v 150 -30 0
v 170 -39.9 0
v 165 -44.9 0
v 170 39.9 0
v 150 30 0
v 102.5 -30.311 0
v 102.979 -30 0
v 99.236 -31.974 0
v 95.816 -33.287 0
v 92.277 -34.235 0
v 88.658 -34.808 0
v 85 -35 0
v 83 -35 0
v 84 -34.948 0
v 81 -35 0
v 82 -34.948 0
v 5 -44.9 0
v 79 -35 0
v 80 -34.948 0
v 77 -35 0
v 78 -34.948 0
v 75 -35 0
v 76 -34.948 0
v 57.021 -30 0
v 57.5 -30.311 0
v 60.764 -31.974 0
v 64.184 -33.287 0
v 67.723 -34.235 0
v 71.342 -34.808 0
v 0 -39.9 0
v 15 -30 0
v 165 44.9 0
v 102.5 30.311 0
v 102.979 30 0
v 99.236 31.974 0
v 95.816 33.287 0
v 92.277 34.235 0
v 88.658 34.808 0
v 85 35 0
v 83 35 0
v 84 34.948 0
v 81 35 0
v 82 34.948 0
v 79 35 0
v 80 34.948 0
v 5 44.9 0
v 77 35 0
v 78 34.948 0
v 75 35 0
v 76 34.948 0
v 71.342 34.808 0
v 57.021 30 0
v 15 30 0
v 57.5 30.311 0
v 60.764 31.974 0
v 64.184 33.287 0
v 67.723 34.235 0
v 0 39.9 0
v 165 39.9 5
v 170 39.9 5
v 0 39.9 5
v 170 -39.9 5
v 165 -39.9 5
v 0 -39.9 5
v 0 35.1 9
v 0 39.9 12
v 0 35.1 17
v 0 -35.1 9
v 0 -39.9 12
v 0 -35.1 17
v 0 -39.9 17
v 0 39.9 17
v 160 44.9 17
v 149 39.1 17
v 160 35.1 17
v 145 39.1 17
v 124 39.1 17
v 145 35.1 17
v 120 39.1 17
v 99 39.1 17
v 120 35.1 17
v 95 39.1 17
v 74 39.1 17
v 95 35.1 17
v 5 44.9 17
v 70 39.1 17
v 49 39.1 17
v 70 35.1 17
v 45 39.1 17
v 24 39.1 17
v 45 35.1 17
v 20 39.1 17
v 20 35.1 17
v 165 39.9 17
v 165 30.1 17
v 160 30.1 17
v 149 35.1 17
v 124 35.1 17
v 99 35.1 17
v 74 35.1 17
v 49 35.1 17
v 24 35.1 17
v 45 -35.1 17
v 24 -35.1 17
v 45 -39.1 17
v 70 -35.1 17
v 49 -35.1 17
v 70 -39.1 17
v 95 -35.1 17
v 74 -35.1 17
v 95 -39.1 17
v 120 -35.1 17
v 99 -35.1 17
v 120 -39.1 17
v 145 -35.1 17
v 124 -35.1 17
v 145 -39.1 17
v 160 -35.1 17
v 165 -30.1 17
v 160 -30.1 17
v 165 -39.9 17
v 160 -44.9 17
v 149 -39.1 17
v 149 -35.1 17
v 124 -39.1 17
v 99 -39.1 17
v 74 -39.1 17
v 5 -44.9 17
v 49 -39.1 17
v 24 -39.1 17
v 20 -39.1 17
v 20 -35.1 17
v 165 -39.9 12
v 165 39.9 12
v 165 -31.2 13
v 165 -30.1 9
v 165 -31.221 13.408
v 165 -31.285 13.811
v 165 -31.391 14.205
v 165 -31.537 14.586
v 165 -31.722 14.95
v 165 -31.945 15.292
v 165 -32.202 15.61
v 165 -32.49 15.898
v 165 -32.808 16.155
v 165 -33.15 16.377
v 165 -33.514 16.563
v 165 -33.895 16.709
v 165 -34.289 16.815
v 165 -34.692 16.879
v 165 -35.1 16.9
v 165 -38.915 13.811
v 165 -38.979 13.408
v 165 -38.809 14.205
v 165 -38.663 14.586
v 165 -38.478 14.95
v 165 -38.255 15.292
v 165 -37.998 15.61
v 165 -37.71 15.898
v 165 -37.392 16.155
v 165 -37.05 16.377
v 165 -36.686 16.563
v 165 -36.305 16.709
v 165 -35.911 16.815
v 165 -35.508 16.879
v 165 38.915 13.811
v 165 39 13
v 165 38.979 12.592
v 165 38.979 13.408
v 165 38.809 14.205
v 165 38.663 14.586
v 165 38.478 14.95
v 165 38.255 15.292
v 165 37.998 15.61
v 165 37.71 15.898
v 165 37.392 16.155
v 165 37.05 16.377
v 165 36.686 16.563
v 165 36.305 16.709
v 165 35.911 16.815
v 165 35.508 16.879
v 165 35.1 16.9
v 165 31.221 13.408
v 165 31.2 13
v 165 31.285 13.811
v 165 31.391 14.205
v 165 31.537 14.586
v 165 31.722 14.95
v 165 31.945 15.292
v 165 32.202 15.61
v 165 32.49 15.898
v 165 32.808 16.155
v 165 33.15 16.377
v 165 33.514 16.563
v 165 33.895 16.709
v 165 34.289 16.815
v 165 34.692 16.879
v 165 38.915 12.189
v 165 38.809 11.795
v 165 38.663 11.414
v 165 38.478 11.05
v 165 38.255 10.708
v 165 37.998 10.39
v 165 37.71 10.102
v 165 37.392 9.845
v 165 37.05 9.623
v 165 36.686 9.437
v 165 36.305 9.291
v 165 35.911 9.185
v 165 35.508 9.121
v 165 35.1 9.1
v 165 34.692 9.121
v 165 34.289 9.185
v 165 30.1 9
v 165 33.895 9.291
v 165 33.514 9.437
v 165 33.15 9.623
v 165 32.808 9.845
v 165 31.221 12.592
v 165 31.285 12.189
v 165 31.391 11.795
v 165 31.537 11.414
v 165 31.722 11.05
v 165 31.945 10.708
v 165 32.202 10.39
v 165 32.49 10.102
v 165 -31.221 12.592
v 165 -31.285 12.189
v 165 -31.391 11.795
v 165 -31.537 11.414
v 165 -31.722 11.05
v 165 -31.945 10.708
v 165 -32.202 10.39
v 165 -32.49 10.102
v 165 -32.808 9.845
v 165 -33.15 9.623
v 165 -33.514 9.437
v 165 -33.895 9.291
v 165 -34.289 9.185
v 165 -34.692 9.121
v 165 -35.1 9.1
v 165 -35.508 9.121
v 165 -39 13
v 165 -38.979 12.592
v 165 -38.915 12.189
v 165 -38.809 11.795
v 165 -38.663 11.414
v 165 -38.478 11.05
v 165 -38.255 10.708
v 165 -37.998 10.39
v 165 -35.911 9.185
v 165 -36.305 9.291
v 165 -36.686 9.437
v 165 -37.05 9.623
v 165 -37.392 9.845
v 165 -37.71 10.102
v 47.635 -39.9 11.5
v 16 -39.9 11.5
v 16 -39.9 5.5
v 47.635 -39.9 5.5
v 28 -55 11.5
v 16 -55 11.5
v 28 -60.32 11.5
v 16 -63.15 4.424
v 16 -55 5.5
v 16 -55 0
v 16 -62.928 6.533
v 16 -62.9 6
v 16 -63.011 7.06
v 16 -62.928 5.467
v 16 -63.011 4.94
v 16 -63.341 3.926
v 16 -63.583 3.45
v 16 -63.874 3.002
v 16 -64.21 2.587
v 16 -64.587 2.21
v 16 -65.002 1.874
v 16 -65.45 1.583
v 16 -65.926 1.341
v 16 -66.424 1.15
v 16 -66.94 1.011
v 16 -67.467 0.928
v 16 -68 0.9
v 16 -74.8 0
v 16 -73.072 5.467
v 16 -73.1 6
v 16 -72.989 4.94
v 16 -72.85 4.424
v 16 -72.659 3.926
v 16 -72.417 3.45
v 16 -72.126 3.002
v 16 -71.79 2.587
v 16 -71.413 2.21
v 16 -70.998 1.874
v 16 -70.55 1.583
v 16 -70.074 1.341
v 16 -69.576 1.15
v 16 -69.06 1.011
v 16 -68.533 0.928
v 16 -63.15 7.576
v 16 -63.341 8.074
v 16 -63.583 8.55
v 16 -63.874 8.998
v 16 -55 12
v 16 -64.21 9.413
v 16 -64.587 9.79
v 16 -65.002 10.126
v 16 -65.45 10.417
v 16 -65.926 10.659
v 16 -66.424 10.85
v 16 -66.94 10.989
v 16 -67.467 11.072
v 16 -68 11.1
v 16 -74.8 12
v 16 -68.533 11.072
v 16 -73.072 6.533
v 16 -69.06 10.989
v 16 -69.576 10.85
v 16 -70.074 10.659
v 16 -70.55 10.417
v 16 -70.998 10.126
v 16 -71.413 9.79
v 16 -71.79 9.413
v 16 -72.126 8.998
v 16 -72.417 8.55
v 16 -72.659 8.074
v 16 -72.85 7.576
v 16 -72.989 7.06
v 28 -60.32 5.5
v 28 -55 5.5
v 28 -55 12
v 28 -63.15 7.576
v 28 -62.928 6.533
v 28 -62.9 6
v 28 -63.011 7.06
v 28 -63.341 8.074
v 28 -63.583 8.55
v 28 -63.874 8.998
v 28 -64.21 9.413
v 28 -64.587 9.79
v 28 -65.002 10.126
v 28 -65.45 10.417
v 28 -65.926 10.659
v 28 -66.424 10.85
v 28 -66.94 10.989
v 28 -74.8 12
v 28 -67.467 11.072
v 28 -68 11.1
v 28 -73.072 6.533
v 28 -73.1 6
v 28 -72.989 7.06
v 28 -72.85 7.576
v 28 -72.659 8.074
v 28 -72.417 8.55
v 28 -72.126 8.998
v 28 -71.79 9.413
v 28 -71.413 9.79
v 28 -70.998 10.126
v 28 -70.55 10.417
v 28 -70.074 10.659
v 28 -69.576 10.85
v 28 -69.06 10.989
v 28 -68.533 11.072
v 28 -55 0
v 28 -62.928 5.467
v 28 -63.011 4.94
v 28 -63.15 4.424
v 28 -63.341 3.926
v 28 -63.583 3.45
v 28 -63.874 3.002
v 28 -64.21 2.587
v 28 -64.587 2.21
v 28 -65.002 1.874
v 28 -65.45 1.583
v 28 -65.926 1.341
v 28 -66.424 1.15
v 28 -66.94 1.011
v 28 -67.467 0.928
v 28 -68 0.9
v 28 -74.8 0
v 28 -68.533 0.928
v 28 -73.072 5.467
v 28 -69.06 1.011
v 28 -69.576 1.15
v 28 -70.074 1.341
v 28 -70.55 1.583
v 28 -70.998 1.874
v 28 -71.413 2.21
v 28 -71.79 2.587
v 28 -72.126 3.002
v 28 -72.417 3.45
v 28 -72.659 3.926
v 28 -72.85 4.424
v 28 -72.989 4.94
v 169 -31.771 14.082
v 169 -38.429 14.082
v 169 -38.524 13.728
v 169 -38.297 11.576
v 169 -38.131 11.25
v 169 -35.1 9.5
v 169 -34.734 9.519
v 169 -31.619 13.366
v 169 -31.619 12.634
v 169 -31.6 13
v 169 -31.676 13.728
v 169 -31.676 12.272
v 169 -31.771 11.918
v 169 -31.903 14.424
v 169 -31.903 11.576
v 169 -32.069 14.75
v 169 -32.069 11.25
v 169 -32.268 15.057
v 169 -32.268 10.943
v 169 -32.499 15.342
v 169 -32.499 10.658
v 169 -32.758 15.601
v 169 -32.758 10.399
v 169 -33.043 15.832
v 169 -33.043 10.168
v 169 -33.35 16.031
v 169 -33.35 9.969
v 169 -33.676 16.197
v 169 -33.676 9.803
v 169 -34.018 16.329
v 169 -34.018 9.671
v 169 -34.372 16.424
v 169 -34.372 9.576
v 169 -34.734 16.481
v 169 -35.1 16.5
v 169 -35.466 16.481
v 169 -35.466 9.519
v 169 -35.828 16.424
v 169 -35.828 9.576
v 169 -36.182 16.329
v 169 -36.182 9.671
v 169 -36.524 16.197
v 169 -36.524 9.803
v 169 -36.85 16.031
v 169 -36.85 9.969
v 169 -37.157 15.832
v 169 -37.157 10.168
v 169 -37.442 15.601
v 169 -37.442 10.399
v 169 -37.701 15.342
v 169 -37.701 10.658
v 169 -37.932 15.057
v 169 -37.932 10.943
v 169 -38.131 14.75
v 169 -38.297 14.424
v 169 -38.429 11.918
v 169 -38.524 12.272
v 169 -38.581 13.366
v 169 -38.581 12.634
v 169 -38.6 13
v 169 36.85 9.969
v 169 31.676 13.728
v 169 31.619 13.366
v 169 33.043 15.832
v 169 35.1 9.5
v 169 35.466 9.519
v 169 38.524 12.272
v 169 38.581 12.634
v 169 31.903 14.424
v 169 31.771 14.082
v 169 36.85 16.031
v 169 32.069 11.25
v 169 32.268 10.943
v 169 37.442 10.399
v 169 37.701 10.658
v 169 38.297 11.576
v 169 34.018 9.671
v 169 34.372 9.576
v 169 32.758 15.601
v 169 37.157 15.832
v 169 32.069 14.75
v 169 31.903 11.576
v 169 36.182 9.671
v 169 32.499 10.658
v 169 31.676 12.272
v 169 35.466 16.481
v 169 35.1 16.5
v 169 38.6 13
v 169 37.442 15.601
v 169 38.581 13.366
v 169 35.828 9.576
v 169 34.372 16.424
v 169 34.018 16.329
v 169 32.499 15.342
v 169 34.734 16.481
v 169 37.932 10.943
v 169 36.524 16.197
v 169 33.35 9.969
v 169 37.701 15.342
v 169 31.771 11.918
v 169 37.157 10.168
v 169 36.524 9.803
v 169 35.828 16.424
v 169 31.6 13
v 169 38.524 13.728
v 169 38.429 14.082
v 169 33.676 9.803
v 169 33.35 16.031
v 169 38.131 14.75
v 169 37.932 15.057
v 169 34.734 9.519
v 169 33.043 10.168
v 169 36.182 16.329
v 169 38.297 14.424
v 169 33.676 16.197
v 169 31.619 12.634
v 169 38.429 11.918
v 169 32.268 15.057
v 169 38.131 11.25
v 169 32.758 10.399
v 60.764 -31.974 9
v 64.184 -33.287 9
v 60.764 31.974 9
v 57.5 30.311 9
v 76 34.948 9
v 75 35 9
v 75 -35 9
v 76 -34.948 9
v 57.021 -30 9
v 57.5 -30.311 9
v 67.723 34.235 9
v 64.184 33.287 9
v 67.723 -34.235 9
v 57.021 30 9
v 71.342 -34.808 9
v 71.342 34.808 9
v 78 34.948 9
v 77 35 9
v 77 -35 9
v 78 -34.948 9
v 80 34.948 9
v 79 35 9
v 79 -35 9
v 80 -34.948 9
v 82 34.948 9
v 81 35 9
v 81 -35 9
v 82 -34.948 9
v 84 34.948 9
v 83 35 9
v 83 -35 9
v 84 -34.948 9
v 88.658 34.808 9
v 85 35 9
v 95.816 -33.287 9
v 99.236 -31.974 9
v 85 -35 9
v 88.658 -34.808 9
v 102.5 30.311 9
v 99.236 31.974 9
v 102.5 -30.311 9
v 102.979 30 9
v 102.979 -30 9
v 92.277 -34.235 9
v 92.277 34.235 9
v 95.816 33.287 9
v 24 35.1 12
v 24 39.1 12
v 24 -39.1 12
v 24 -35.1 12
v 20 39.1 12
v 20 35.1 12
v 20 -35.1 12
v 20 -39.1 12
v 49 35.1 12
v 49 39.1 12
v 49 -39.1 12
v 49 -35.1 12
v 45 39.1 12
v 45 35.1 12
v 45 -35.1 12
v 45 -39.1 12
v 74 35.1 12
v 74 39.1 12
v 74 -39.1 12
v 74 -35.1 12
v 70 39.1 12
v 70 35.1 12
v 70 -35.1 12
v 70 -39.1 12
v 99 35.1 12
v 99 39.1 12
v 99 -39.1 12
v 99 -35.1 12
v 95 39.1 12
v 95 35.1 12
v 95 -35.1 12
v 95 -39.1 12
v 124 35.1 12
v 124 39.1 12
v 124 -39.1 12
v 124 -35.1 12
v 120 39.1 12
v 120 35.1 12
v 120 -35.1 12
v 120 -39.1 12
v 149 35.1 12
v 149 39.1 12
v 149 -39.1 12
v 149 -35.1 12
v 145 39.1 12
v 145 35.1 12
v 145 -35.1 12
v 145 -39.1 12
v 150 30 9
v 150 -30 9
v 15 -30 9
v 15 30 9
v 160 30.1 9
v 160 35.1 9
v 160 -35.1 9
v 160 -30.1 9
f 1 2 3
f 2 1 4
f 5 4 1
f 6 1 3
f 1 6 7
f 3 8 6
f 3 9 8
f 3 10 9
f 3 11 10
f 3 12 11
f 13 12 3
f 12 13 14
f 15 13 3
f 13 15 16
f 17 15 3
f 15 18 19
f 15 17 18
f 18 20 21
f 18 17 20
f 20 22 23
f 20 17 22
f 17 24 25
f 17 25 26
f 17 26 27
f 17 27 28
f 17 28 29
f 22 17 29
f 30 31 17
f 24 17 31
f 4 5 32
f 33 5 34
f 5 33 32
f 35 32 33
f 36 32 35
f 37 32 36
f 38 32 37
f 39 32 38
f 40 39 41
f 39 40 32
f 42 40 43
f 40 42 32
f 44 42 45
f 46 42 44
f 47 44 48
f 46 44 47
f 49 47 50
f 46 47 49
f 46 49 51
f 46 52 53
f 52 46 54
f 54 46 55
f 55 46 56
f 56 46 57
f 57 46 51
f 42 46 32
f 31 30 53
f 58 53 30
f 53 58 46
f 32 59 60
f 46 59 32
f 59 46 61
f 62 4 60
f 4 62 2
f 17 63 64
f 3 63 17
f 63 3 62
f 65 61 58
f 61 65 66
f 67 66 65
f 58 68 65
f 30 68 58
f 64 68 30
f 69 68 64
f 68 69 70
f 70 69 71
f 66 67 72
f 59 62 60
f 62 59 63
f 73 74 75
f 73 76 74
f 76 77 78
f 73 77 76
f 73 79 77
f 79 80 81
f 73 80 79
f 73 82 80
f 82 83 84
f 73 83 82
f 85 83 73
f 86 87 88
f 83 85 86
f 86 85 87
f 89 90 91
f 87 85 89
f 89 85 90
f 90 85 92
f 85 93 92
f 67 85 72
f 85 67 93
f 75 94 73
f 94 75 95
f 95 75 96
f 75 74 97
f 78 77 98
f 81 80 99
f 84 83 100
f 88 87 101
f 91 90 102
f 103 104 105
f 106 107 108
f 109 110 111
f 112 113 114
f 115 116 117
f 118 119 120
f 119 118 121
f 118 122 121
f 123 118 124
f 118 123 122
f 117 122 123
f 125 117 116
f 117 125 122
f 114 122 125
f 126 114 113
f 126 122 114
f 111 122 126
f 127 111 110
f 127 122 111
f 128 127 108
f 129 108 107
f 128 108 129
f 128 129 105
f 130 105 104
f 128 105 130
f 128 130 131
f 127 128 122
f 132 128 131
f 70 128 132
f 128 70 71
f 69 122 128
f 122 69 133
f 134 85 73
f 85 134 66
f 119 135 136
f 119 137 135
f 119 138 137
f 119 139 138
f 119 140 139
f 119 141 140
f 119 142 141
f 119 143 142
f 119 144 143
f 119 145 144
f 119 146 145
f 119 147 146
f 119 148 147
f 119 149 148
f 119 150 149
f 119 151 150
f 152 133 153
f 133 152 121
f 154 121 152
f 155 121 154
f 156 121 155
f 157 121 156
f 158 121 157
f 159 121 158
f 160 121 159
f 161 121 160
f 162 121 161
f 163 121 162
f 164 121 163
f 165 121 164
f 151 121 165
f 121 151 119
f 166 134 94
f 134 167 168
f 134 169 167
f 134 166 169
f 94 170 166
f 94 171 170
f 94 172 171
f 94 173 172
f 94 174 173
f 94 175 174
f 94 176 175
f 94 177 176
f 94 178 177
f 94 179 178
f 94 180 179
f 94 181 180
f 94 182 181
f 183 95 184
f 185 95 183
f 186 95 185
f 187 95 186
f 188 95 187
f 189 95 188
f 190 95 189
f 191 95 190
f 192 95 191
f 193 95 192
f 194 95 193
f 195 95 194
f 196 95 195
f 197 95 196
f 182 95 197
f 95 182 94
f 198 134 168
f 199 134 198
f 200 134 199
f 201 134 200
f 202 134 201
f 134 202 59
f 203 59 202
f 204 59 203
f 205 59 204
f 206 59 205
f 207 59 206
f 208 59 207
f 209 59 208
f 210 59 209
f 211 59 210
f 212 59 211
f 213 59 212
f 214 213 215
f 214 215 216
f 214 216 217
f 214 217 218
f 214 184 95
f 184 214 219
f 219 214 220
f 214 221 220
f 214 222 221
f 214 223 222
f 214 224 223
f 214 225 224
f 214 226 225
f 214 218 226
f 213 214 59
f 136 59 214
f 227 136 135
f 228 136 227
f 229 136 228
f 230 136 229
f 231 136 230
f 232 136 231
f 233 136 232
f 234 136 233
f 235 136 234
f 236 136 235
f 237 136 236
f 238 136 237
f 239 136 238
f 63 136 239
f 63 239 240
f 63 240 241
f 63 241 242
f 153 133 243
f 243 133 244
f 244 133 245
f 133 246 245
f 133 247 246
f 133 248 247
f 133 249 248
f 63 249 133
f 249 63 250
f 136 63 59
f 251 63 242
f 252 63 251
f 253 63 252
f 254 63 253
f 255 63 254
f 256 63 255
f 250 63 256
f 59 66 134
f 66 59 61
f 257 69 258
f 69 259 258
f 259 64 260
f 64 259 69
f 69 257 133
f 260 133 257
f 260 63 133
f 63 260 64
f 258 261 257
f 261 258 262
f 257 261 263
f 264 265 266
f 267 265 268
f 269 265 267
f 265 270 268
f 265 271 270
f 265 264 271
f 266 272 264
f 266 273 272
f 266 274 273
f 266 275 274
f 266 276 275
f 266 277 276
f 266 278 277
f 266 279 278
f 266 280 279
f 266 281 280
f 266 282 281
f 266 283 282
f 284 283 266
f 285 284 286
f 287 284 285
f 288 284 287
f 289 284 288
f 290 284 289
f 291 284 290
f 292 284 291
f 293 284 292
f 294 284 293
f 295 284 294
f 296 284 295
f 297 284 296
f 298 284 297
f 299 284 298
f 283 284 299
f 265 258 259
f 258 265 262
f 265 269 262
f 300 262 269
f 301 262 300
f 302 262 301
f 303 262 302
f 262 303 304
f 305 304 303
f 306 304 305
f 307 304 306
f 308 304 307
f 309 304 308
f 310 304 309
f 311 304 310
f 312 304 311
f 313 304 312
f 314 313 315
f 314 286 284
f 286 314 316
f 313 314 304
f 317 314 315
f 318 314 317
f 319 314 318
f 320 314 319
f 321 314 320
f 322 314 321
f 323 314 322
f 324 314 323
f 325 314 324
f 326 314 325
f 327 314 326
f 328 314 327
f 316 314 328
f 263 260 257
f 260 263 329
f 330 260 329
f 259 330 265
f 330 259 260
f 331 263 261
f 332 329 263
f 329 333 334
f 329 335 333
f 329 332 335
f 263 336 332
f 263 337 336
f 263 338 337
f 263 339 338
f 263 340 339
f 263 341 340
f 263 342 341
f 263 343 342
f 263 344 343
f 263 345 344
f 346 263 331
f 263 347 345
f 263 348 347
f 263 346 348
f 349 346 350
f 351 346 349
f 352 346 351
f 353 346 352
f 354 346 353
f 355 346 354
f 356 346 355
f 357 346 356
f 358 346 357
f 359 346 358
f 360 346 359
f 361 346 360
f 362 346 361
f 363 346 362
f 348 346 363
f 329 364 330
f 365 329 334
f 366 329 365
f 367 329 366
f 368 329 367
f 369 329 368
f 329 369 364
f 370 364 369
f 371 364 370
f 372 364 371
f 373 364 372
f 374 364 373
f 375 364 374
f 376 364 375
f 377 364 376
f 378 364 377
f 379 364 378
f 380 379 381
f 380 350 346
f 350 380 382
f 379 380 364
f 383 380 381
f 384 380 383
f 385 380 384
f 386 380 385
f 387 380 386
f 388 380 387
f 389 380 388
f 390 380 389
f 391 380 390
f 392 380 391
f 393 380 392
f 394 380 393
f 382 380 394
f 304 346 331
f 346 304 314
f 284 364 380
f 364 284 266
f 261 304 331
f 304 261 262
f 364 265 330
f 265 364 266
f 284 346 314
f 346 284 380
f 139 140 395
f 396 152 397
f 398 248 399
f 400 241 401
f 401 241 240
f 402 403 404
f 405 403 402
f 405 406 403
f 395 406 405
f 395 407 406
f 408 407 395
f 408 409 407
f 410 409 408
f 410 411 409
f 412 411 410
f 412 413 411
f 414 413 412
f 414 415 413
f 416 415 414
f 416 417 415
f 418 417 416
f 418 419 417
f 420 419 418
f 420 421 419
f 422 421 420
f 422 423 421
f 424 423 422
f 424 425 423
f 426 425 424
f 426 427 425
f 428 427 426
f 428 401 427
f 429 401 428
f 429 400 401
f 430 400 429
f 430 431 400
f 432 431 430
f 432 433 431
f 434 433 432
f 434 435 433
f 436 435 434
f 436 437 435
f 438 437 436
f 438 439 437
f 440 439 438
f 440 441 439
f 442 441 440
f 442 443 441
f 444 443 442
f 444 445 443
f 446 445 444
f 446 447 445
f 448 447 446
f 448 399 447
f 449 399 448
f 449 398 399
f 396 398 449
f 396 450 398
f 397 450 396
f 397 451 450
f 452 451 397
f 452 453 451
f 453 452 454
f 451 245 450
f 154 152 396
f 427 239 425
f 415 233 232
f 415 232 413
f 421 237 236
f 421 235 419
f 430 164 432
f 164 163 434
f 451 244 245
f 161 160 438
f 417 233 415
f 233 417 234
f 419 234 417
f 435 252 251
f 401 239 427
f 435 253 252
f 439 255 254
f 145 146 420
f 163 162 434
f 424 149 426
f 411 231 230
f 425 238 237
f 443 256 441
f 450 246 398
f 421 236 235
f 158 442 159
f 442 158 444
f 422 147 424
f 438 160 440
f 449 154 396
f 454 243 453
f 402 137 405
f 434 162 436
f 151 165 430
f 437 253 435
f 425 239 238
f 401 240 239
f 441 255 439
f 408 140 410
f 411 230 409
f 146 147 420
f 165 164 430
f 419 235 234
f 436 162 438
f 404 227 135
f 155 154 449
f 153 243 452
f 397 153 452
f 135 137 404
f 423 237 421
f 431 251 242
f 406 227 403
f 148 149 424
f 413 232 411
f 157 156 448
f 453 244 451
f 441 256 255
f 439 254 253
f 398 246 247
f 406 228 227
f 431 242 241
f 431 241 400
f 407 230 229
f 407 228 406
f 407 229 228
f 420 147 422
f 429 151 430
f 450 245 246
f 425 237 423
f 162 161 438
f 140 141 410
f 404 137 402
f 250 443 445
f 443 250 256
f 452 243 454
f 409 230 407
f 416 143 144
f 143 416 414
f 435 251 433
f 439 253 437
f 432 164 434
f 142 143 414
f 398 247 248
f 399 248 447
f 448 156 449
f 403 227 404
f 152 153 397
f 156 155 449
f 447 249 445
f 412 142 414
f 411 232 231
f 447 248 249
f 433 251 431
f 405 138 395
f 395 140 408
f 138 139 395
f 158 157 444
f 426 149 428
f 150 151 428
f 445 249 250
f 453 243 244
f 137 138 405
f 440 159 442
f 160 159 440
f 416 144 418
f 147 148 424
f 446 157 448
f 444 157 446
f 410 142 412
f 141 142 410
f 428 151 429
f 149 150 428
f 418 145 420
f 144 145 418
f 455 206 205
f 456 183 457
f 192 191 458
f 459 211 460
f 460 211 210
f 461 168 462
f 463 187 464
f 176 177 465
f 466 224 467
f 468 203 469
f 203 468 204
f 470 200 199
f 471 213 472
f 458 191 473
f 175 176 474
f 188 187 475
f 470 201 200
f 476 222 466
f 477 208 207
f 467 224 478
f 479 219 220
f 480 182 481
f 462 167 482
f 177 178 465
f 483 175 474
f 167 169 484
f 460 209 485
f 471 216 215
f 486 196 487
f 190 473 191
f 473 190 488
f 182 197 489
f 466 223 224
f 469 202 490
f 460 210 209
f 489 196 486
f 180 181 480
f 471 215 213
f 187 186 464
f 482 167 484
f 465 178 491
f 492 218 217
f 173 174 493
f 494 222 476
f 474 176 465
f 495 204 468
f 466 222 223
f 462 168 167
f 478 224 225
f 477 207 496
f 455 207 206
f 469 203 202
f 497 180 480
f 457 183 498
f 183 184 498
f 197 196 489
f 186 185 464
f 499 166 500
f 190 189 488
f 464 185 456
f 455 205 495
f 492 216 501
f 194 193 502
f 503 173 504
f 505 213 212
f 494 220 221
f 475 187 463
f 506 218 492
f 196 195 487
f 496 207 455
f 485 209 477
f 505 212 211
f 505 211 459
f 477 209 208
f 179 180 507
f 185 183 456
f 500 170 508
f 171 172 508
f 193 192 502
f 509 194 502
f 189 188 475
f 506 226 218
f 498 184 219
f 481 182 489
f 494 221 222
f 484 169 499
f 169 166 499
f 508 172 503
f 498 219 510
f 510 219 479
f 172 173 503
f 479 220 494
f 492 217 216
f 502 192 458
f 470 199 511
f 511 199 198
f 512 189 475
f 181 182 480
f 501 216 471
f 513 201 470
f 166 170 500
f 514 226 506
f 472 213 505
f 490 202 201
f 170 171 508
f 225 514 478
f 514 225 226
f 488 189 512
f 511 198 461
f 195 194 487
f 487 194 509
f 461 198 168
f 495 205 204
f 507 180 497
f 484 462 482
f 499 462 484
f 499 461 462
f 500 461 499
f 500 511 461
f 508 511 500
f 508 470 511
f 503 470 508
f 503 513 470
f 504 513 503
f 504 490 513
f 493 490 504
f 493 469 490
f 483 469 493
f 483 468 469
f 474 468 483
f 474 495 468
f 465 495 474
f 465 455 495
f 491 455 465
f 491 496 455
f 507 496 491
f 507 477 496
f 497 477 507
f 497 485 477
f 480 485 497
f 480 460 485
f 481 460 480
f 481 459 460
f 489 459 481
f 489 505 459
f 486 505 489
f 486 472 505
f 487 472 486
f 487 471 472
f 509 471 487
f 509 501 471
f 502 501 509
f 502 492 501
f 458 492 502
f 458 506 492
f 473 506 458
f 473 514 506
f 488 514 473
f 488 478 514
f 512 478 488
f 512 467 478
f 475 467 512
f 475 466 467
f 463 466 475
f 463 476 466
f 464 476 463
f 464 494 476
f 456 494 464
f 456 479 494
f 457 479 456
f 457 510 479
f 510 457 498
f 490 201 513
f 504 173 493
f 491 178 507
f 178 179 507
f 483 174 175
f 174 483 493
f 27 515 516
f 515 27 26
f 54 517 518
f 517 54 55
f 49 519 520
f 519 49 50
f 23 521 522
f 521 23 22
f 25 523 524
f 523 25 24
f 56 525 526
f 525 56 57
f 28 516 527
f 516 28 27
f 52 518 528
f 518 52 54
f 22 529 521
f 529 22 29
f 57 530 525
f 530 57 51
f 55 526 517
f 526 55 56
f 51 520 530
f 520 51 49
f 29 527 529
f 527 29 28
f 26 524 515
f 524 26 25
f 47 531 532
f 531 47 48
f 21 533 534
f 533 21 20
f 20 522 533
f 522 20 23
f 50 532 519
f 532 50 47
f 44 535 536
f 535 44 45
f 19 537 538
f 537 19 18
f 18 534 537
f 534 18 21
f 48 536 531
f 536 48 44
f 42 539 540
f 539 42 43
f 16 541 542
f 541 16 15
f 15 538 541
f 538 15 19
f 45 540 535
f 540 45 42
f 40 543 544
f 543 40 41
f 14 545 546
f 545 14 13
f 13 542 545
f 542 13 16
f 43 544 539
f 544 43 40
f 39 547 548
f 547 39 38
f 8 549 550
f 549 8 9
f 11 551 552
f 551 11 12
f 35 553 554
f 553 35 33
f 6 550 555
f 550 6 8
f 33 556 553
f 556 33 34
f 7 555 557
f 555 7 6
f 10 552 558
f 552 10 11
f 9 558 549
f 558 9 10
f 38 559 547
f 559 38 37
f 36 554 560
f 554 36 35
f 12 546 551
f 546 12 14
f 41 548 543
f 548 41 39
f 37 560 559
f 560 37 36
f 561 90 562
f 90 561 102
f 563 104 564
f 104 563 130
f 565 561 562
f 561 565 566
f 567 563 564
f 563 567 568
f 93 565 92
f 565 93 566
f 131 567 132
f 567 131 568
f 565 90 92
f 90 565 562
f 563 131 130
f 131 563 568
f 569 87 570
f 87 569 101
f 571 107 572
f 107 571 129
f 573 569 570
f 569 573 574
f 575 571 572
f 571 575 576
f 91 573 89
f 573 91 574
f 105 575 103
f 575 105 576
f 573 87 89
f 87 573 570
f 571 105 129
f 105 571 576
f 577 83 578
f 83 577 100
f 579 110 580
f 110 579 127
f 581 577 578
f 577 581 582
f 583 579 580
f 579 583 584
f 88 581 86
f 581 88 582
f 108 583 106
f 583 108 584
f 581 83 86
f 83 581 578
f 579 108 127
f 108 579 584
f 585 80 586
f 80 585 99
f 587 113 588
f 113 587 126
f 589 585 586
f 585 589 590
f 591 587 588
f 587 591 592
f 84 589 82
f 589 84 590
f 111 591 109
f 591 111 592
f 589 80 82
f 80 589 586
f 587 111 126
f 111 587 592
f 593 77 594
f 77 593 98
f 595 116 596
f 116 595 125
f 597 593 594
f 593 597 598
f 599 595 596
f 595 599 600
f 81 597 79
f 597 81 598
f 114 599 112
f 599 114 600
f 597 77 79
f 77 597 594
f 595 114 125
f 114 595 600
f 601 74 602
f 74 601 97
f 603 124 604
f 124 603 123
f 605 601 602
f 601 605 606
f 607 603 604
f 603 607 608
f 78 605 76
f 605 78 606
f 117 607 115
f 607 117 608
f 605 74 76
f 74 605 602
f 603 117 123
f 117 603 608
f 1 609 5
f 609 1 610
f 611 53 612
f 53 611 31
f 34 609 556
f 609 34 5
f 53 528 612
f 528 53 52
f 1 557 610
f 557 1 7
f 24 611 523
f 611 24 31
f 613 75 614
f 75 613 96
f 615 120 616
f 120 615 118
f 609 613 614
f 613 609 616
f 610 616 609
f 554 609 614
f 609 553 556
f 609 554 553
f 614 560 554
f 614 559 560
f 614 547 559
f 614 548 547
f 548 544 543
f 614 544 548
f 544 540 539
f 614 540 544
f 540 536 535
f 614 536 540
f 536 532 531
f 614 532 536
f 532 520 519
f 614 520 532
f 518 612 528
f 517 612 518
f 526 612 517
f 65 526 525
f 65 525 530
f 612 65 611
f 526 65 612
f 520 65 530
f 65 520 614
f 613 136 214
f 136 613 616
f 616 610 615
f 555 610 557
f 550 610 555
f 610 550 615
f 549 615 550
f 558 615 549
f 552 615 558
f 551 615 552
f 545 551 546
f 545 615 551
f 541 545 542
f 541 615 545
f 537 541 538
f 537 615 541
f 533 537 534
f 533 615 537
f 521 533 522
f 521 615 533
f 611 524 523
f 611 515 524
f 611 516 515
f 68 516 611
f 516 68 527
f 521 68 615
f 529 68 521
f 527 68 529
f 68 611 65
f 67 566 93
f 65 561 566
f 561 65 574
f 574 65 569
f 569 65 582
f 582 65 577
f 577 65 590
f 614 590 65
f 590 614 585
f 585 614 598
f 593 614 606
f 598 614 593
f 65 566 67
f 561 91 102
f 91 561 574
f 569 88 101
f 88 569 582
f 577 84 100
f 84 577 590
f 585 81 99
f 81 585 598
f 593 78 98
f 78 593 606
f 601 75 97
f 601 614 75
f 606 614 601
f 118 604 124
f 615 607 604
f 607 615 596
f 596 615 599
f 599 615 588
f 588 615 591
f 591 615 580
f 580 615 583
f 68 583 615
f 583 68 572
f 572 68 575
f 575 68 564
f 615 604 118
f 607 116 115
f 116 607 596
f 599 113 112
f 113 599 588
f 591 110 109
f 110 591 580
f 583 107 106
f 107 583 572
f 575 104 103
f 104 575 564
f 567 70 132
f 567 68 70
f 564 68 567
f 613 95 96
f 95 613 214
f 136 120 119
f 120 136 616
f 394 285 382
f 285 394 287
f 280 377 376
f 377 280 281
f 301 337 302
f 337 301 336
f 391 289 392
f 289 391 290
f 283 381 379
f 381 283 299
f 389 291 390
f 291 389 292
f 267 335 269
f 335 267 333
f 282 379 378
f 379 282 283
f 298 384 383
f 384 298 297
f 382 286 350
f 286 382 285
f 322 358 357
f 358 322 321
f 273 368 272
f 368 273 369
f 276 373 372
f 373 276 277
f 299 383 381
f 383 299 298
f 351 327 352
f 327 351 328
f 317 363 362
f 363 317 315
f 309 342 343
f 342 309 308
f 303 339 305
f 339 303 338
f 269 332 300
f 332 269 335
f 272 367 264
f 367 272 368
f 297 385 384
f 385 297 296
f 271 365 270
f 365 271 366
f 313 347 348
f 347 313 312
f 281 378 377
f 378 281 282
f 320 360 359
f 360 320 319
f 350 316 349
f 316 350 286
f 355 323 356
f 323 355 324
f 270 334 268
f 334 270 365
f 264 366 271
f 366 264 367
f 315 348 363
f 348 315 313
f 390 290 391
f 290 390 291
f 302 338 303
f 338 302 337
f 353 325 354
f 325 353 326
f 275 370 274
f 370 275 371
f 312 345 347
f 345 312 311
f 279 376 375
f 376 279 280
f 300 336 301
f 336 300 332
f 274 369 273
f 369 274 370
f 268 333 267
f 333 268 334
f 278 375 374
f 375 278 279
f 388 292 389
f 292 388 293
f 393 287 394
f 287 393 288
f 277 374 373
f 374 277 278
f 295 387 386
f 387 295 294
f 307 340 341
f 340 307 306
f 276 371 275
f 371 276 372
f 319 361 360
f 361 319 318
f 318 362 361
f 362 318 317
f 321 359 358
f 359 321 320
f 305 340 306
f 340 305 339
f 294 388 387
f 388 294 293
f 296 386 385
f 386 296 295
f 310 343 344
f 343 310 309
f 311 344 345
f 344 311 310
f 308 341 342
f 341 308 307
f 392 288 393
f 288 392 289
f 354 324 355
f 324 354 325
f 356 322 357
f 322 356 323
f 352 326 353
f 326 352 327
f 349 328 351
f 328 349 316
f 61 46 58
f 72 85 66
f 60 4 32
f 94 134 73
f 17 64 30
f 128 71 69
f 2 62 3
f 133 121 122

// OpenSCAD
// file: modules.scad
/*
This is a collection of the modules which are used heavily within the whole project.
Almost all parts rely on the modules to remain "as is", especially regarding their current orientation.
So please act very carefully here, otherwise you may screw up the complete design!

*/

// roof module - this is heavily used for dovetail cutouts
// please keep as is
module roof(l, w, h){
    polyhedron(
        points=[
            [0,0,0],
            [l,0,0],
            [l,w,0],
            [0,w,0],
            [0,w/2,h],
            [l,w/2,h]
            ],
        faces=[
            [0,1,2,3],
            [0,4,1],
            [1,4,5,2],
            [2,5,3],
            [3,5,4,0]
            ]
            );
    };

// a wedge module - this is heavily used for cutting edges
// please keep as is    
module wedge(l, w, h) {
    polyhedron(
            points=[
                [0,0,0],
                [l,0,0],
                [l,w,0],
                [0,w,0],
                [0,0,h],
                [l,0,h]
            ],
            faces=[
                [0,3,2,1],
                [0,1,5,4],
                [1,2,5],
                [2,3,4,5],
                [3,0,4]
            ]
    );
   };

// simple tube module.   
module tube(d1, d2, h) {
    difference() {
        cylinder(d=d1, h=h);
        cylinder(d=d2, h=h);
        };
    };

// mainly used for making holes for countersunk screws
// please keep as is    
module countersunk_screw(vScrew_d, vScrew_l){
    union(){
    cylinder(d=vScrew_d, h= vScrew_l);
    cylinder(d1=vScrew_d*2, h=vScrew_d);
    };
};

// module for making hexagons, e.g. hex nuts. kw is the key width
// please keep as is
module hex(kw, h) {
	render()
        translate([0, 0, h/2])
            intersection_for(a = [0, 120, 240]) {
                rotate([0, 0, a])
                    cube([kw, 3 * kw, h], true);
                }
}
// main file
// some variables
$fn = 60; // we are using 60 fragments for cylinders and similar objects

// some modules such as hex, countersunk screws, roof, wedge are available in a module file
use <modules.scad>;

    


vTolerance = 0.2;    
vRailTolerance = 0.2;
    
vLowerRail_l = 170; // we need 5mm space to move backwards for the lid lock
vLowerRailOuter_w = 90-vRailTolerance;
vLowerRailInner_w = 80-vRailTolerance;
vLowerRail_h = 5;
vLowerRail_offsetX = 0;
vLowerRail_offsetY = -vLowerRailOuter_w/2;
vLowerRail_offsetZ = 0;

vUpperRail_l = vLowerRail_l-5;
vUpperRailOuter_w = vLowerRailOuter_w;
vUpperRail_h = vLowerRail_h;
vUpperRail_offsetX = 0;
vUpperRail_offsetY = -(vUpperRailOuter_w/2);
vUpperRail_offsetZ = 0;

vMidSection_h = 7;

vUpperBlock_l = vUpperRail_l;
vUpperBlock_w = vLowerRailInner_w;
vUpperBlock_h = vUpperRail_h + vMidSection_h;
vUpperBlock_offsetX = 0;
vUpperBlock_offsetY = -vUpperBlock_w/2;
vUpperBlock_offsetZ = vLowerRail_h;

vMidCutout_l = vUpperRail_l-30;
vMidCutout_w = 60;
vMidCutout_h = vLowerRail_h+vUpperBlock_h;
vMidCutout_offsetX = 15;
vMidCutout_offsetY = -vMidCutout_w/2;
vMidCutout_offsetZ = 0;

vUpperCutout_l = vUpperRail_l-5;
vUpperCutout_w = 70+vRailTolerance;
vUpperCutout_h = vMidSection_h+1;
vUpperCutout_offsetX = 0;
vUpperCutout_offsetY = -vUpperCutout_w/2;
vUpperCutout_offsetZ = vMidCutout_h-vUpperCutout_h;

vFrontCutout_l = vUpperRail_l;
vFrontCutout_w = vUpperCutout_w-10;
vFrontCutout_h = vUpperCutout_h;
vFrontCutout_offsetX = 0;
vFrontCutout_offsetY = -vFrontCutout_w/2;
vFrontCutout_offsetZ = vUpperCutout_offsetZ;

vLensCutout_d = 70;
vLensCutout_h = vLowerRail_h+vUpperBlock_h;
vLensCutout_offsetX = 75;
vLensCutout_offsetY = 0;
vLensCutout_offsetZ = 0;

// cutout for stop indents
vStopIndent_l = 4;
vStopIndent_w = vUpperCutout_w + (2*vStopIndent_l);
vStopIndent_h = 5;
vStopIndentDistance = 25;
vStopIndentCount = floor(vUpperRail_l/vStopIndentDistance);
vStopIndent_offsetX = 20;
vStopIndent_offsetY = -vStopIndent_w/2;
vStopIndent_offsetZ = vLowerRail_h+vMidSection_h+vUpperRail_h-vStopIndent_h;

vFocusingLever_l = 70;
vFocusingLever_w = 75-vTolerance;
vFocusingLever_h = vMidSection_h-1;
vFocusingLever_offsetX = 16;
vFocusingLever_offsetY = 0;
vFocusingLever_offsetZ = vLowerRail_h + vFocusingLever_h + 0.5;

vFocusingThreadBlock_l = 12;
vFocusingThreadBlock_w = 20-vTolerance;
vFocusingThreadBlock_h = 12;
vFocusingThreadBlock_offsetX = vFocusingLever_offsetX;
vFocusingThreadBlock_offsetY = -vFocusingLever_w;
vFocusingThreadBlock_offsetZ = 0;

vFocusingThreadHole_d = 10.2;
vFocusingThreadHole_h = vFocusingLever_l;
vFocusingThreadHole_offsetX = vFocusingLever_offsetX;
vFocusingThreadHole_offsetY = -68;
//vFocusingThreadHole_offsetZ = vFocusingThreadBlock_h/2;
vFocusingThreadHole_offsetZ = 6;

vLidLockBase_d = 8;
vLidLock_d1 = vLidLockBase_d-vTolerance;
vLidLock_d2 = vLidLockBase_d-1;
vLidLock_h = 4;
vLidLock_offsetX = vUpperRail_l; // we need a locking lenght of about 4mm
vLidLock_offsetY = -vUpperCutout_w/2;
vLidLock_offsetZ = 5+vLidLockBase_d;

vEdgeCutoff = 5;
vEdgeCutoff_h = vLowerRail_h+vMidSection_h+vUpperRail_h;


difference(){
union(){
    // lower rail
    difference(){
        translate([vLowerRail_offsetX, vLowerRail_offsetY, vLowerRail_offsetZ])
            roof(vLowerRail_l, vLowerRailOuter_w, vLowerRailOuter_w/2);
        translate([vLowerRail_offsetX, vLowerRail_offsetY, vLowerRail_h])
            cube([vLowerRail_l, vLowerRailOuter_w, vLowerRailOuter_w/2]);    
    };

    // upper block
    translate([vUpperBlock_offsetX, vUpperBlock_offsetY, vUpperBlock_offsetZ])
            cube([vUpperBlock_l, vUpperBlock_w, vUpperBlock_h]);    
    
    // focusing lever
    translate([vFocusingLever_offsetX, vFocusingLever_offsetY, vFocusingLever_offsetZ])
        rotate([0, 90, 0])
            wedge(vFocusingLever_h, -vFocusingLever_w+2, vFocusingLever_l);
    
    
    // focusing lever thread block
    translate([vFocusingThreadBlock_offsetX, vFocusingThreadBlock_offsetY, vFocusingThreadBlock_offsetZ])
                cube([vFocusingThreadBlock_l, vFocusingThreadBlock_w, vFocusingThreadBlock_h]);
        
    // lid lock bolts
    translate([vLidLock_offsetX, vLidLock_offsetY, vLidLock_offsetZ])
        rotate([0, 90, 0])
            cylinder(d1=vLidLock_d1, d2=vLidLock_d2, h=vLidLock_h);
    translate([vLidLock_offsetX, -vLidLock_offsetY, vLidLock_offsetZ])
        rotate([0, 90, 0])
            cylinder(d1=vLidLock_d1, d2=vLidLock_d2, h=vLidLock_h);
    
    // lower rail
    translate([0,0,vLowerRail_h+vUpperBlock_h])
        mirror([0,0,1]){
            difference(){
                translate([vUpperRail_offsetX, vUpperRail_offsetY, vUpperRail_offsetZ])
                    roof(vUpperRail_l, vUpperRailOuter_w, vUpperRailOuter_w/2);
                translate([vUpperRail_offsetX, vUpperRail_offsetY, vUpperRail_h])
                    cube([vUpperRail_l, vUpperRailOuter_w, vUpperRailOuter_w/2]);    
            };
        };

    };
    
    // mid cutout
    translate([vMidCutout_offsetX, vMidCutout_offsetY, vMidCutout_offsetZ])
        cube([vMidCutout_l, vMidCutout_w, vMidCutout_h]); 
 
    // upper cutout
    translate([vUpperCutout_offsetX, vUpperCutout_offsetY, vUpperCutout_offsetZ])
        cube([vUpperCutout_l, vUpperCutout_w, vUpperCutout_h]);
   
    // front cutout
    translate([vFrontCutout_offsetX, vFrontCutout_offsetY, vFrontCutout_offsetZ])
        cube([vFrontCutout_l, vFrontCutout_w, vFrontCutout_h]);
    
    for (i = [0:5]){ 
    // lens cutout
    translate([vLensCutout_offsetX+(i*2), vLensCutout_offsetY, vLensCutout_offsetZ])
        cylinder(d=vLensCutout_d, h=vLensCutout_h);
    };
    
    // stop indents
    for (i=[0:vStopIndentCount]){
    translate([i*vStopIndentDistance+vStopIndent_offsetX, vStopIndent_offsetY, vStopIndent_offsetZ])
        cube([vStopIndent_l, vStopIndent_w, vStopIndent_h]);        
    };

    // focusing thread hole
    translate([vFocusingThreadHole_offsetX, vFocusingThreadHole_offsetY, vFocusingThreadHole_offsetZ])
        rotate([0, 90, 0])
            cylinder(d=vFocusingThreadHole_d, h=vFocusingThreadHole_h);
    
    // edge cutoff
    // back left
    translate([0, -vLowerRail_offsetY, 0])
        rotate([0, -90, 0])
            wedge(vEdgeCutoff_h, -vEdgeCutoff, -vEdgeCutoff);
    // lower front left
    translate([vLowerRail_l, -vLowerRail_offsetY, 0])
        rotate([0, -90, 0])
            wedge(vEdgeCutoff_h, -vEdgeCutoff, vEdgeCutoff);
    // upper front left
    translate([vUpperRail_l, -vLowerRail_offsetY, vLowerRail_h])
        rotate([0, -90, 0])
            wedge(vEdgeCutoff_h, -vEdgeCutoff, vEdgeCutoff);
    // back right
    translate([0, vLowerRail_offsetY, 0])
        rotate([0, -90, 0])
            wedge(vEdgeCutoff_h, vEdgeCutoff, -vEdgeCutoff);
    // lower front right
    translate([vLowerRail_l, vLowerRail_offsetY, 0])
        rotate([0, -90, 0])
            wedge(vEdgeCutoff_h, vEdgeCutoff, vEdgeCutoff);
    // upper front right
    translate([vUpperRail_l, vLowerRail_offsetY, vLowerRail_h])
        rotate([0, -90, 0])
            wedge(vEdgeCutoff_h, vEdgeCutoff, vEdgeCutoff);
    
};
